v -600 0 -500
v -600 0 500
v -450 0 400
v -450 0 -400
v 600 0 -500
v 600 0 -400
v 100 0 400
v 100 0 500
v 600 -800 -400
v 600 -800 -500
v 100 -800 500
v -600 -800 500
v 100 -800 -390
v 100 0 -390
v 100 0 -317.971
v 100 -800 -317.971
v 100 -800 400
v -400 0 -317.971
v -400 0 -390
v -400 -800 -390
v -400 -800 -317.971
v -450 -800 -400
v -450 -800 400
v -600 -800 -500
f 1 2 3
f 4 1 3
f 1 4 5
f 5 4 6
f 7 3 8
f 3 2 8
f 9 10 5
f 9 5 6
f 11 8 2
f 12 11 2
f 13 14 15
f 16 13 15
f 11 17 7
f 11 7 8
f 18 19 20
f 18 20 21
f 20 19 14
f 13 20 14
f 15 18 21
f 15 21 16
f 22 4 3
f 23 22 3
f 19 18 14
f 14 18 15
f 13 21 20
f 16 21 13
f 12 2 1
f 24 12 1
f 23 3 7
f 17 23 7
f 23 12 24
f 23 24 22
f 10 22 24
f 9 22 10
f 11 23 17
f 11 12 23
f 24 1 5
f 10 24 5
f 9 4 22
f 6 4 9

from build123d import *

# Parameters (mm, degrees)
F0_W     = 550
F0_H     = 100
F0_W_2   = 1050
F0_W_3   = 500
F0_H_2   = 72.028898
F1_DEPTH = 800


with BuildPart() as f1:
    # F0 (on Front) → F1 (new body)
    with BuildSketch(Plane.XZ):
        Polygon((-450, 500), (-600, 500), (-600, -500), (-450, -500), (-450, -400), (-450, 400), align=None)
        with Locations((-175, 450)):
            Rectangle(F0_W, F0_H)
        with Locations((75, -450)):
            Rectangle(F0_W_2, F0_H)
        with Locations((-150, -353.985551)):
            Rectangle(F0_W_3, F0_H_2)
    extrude(amount=F1_DEPTH)


solid = f1.part
